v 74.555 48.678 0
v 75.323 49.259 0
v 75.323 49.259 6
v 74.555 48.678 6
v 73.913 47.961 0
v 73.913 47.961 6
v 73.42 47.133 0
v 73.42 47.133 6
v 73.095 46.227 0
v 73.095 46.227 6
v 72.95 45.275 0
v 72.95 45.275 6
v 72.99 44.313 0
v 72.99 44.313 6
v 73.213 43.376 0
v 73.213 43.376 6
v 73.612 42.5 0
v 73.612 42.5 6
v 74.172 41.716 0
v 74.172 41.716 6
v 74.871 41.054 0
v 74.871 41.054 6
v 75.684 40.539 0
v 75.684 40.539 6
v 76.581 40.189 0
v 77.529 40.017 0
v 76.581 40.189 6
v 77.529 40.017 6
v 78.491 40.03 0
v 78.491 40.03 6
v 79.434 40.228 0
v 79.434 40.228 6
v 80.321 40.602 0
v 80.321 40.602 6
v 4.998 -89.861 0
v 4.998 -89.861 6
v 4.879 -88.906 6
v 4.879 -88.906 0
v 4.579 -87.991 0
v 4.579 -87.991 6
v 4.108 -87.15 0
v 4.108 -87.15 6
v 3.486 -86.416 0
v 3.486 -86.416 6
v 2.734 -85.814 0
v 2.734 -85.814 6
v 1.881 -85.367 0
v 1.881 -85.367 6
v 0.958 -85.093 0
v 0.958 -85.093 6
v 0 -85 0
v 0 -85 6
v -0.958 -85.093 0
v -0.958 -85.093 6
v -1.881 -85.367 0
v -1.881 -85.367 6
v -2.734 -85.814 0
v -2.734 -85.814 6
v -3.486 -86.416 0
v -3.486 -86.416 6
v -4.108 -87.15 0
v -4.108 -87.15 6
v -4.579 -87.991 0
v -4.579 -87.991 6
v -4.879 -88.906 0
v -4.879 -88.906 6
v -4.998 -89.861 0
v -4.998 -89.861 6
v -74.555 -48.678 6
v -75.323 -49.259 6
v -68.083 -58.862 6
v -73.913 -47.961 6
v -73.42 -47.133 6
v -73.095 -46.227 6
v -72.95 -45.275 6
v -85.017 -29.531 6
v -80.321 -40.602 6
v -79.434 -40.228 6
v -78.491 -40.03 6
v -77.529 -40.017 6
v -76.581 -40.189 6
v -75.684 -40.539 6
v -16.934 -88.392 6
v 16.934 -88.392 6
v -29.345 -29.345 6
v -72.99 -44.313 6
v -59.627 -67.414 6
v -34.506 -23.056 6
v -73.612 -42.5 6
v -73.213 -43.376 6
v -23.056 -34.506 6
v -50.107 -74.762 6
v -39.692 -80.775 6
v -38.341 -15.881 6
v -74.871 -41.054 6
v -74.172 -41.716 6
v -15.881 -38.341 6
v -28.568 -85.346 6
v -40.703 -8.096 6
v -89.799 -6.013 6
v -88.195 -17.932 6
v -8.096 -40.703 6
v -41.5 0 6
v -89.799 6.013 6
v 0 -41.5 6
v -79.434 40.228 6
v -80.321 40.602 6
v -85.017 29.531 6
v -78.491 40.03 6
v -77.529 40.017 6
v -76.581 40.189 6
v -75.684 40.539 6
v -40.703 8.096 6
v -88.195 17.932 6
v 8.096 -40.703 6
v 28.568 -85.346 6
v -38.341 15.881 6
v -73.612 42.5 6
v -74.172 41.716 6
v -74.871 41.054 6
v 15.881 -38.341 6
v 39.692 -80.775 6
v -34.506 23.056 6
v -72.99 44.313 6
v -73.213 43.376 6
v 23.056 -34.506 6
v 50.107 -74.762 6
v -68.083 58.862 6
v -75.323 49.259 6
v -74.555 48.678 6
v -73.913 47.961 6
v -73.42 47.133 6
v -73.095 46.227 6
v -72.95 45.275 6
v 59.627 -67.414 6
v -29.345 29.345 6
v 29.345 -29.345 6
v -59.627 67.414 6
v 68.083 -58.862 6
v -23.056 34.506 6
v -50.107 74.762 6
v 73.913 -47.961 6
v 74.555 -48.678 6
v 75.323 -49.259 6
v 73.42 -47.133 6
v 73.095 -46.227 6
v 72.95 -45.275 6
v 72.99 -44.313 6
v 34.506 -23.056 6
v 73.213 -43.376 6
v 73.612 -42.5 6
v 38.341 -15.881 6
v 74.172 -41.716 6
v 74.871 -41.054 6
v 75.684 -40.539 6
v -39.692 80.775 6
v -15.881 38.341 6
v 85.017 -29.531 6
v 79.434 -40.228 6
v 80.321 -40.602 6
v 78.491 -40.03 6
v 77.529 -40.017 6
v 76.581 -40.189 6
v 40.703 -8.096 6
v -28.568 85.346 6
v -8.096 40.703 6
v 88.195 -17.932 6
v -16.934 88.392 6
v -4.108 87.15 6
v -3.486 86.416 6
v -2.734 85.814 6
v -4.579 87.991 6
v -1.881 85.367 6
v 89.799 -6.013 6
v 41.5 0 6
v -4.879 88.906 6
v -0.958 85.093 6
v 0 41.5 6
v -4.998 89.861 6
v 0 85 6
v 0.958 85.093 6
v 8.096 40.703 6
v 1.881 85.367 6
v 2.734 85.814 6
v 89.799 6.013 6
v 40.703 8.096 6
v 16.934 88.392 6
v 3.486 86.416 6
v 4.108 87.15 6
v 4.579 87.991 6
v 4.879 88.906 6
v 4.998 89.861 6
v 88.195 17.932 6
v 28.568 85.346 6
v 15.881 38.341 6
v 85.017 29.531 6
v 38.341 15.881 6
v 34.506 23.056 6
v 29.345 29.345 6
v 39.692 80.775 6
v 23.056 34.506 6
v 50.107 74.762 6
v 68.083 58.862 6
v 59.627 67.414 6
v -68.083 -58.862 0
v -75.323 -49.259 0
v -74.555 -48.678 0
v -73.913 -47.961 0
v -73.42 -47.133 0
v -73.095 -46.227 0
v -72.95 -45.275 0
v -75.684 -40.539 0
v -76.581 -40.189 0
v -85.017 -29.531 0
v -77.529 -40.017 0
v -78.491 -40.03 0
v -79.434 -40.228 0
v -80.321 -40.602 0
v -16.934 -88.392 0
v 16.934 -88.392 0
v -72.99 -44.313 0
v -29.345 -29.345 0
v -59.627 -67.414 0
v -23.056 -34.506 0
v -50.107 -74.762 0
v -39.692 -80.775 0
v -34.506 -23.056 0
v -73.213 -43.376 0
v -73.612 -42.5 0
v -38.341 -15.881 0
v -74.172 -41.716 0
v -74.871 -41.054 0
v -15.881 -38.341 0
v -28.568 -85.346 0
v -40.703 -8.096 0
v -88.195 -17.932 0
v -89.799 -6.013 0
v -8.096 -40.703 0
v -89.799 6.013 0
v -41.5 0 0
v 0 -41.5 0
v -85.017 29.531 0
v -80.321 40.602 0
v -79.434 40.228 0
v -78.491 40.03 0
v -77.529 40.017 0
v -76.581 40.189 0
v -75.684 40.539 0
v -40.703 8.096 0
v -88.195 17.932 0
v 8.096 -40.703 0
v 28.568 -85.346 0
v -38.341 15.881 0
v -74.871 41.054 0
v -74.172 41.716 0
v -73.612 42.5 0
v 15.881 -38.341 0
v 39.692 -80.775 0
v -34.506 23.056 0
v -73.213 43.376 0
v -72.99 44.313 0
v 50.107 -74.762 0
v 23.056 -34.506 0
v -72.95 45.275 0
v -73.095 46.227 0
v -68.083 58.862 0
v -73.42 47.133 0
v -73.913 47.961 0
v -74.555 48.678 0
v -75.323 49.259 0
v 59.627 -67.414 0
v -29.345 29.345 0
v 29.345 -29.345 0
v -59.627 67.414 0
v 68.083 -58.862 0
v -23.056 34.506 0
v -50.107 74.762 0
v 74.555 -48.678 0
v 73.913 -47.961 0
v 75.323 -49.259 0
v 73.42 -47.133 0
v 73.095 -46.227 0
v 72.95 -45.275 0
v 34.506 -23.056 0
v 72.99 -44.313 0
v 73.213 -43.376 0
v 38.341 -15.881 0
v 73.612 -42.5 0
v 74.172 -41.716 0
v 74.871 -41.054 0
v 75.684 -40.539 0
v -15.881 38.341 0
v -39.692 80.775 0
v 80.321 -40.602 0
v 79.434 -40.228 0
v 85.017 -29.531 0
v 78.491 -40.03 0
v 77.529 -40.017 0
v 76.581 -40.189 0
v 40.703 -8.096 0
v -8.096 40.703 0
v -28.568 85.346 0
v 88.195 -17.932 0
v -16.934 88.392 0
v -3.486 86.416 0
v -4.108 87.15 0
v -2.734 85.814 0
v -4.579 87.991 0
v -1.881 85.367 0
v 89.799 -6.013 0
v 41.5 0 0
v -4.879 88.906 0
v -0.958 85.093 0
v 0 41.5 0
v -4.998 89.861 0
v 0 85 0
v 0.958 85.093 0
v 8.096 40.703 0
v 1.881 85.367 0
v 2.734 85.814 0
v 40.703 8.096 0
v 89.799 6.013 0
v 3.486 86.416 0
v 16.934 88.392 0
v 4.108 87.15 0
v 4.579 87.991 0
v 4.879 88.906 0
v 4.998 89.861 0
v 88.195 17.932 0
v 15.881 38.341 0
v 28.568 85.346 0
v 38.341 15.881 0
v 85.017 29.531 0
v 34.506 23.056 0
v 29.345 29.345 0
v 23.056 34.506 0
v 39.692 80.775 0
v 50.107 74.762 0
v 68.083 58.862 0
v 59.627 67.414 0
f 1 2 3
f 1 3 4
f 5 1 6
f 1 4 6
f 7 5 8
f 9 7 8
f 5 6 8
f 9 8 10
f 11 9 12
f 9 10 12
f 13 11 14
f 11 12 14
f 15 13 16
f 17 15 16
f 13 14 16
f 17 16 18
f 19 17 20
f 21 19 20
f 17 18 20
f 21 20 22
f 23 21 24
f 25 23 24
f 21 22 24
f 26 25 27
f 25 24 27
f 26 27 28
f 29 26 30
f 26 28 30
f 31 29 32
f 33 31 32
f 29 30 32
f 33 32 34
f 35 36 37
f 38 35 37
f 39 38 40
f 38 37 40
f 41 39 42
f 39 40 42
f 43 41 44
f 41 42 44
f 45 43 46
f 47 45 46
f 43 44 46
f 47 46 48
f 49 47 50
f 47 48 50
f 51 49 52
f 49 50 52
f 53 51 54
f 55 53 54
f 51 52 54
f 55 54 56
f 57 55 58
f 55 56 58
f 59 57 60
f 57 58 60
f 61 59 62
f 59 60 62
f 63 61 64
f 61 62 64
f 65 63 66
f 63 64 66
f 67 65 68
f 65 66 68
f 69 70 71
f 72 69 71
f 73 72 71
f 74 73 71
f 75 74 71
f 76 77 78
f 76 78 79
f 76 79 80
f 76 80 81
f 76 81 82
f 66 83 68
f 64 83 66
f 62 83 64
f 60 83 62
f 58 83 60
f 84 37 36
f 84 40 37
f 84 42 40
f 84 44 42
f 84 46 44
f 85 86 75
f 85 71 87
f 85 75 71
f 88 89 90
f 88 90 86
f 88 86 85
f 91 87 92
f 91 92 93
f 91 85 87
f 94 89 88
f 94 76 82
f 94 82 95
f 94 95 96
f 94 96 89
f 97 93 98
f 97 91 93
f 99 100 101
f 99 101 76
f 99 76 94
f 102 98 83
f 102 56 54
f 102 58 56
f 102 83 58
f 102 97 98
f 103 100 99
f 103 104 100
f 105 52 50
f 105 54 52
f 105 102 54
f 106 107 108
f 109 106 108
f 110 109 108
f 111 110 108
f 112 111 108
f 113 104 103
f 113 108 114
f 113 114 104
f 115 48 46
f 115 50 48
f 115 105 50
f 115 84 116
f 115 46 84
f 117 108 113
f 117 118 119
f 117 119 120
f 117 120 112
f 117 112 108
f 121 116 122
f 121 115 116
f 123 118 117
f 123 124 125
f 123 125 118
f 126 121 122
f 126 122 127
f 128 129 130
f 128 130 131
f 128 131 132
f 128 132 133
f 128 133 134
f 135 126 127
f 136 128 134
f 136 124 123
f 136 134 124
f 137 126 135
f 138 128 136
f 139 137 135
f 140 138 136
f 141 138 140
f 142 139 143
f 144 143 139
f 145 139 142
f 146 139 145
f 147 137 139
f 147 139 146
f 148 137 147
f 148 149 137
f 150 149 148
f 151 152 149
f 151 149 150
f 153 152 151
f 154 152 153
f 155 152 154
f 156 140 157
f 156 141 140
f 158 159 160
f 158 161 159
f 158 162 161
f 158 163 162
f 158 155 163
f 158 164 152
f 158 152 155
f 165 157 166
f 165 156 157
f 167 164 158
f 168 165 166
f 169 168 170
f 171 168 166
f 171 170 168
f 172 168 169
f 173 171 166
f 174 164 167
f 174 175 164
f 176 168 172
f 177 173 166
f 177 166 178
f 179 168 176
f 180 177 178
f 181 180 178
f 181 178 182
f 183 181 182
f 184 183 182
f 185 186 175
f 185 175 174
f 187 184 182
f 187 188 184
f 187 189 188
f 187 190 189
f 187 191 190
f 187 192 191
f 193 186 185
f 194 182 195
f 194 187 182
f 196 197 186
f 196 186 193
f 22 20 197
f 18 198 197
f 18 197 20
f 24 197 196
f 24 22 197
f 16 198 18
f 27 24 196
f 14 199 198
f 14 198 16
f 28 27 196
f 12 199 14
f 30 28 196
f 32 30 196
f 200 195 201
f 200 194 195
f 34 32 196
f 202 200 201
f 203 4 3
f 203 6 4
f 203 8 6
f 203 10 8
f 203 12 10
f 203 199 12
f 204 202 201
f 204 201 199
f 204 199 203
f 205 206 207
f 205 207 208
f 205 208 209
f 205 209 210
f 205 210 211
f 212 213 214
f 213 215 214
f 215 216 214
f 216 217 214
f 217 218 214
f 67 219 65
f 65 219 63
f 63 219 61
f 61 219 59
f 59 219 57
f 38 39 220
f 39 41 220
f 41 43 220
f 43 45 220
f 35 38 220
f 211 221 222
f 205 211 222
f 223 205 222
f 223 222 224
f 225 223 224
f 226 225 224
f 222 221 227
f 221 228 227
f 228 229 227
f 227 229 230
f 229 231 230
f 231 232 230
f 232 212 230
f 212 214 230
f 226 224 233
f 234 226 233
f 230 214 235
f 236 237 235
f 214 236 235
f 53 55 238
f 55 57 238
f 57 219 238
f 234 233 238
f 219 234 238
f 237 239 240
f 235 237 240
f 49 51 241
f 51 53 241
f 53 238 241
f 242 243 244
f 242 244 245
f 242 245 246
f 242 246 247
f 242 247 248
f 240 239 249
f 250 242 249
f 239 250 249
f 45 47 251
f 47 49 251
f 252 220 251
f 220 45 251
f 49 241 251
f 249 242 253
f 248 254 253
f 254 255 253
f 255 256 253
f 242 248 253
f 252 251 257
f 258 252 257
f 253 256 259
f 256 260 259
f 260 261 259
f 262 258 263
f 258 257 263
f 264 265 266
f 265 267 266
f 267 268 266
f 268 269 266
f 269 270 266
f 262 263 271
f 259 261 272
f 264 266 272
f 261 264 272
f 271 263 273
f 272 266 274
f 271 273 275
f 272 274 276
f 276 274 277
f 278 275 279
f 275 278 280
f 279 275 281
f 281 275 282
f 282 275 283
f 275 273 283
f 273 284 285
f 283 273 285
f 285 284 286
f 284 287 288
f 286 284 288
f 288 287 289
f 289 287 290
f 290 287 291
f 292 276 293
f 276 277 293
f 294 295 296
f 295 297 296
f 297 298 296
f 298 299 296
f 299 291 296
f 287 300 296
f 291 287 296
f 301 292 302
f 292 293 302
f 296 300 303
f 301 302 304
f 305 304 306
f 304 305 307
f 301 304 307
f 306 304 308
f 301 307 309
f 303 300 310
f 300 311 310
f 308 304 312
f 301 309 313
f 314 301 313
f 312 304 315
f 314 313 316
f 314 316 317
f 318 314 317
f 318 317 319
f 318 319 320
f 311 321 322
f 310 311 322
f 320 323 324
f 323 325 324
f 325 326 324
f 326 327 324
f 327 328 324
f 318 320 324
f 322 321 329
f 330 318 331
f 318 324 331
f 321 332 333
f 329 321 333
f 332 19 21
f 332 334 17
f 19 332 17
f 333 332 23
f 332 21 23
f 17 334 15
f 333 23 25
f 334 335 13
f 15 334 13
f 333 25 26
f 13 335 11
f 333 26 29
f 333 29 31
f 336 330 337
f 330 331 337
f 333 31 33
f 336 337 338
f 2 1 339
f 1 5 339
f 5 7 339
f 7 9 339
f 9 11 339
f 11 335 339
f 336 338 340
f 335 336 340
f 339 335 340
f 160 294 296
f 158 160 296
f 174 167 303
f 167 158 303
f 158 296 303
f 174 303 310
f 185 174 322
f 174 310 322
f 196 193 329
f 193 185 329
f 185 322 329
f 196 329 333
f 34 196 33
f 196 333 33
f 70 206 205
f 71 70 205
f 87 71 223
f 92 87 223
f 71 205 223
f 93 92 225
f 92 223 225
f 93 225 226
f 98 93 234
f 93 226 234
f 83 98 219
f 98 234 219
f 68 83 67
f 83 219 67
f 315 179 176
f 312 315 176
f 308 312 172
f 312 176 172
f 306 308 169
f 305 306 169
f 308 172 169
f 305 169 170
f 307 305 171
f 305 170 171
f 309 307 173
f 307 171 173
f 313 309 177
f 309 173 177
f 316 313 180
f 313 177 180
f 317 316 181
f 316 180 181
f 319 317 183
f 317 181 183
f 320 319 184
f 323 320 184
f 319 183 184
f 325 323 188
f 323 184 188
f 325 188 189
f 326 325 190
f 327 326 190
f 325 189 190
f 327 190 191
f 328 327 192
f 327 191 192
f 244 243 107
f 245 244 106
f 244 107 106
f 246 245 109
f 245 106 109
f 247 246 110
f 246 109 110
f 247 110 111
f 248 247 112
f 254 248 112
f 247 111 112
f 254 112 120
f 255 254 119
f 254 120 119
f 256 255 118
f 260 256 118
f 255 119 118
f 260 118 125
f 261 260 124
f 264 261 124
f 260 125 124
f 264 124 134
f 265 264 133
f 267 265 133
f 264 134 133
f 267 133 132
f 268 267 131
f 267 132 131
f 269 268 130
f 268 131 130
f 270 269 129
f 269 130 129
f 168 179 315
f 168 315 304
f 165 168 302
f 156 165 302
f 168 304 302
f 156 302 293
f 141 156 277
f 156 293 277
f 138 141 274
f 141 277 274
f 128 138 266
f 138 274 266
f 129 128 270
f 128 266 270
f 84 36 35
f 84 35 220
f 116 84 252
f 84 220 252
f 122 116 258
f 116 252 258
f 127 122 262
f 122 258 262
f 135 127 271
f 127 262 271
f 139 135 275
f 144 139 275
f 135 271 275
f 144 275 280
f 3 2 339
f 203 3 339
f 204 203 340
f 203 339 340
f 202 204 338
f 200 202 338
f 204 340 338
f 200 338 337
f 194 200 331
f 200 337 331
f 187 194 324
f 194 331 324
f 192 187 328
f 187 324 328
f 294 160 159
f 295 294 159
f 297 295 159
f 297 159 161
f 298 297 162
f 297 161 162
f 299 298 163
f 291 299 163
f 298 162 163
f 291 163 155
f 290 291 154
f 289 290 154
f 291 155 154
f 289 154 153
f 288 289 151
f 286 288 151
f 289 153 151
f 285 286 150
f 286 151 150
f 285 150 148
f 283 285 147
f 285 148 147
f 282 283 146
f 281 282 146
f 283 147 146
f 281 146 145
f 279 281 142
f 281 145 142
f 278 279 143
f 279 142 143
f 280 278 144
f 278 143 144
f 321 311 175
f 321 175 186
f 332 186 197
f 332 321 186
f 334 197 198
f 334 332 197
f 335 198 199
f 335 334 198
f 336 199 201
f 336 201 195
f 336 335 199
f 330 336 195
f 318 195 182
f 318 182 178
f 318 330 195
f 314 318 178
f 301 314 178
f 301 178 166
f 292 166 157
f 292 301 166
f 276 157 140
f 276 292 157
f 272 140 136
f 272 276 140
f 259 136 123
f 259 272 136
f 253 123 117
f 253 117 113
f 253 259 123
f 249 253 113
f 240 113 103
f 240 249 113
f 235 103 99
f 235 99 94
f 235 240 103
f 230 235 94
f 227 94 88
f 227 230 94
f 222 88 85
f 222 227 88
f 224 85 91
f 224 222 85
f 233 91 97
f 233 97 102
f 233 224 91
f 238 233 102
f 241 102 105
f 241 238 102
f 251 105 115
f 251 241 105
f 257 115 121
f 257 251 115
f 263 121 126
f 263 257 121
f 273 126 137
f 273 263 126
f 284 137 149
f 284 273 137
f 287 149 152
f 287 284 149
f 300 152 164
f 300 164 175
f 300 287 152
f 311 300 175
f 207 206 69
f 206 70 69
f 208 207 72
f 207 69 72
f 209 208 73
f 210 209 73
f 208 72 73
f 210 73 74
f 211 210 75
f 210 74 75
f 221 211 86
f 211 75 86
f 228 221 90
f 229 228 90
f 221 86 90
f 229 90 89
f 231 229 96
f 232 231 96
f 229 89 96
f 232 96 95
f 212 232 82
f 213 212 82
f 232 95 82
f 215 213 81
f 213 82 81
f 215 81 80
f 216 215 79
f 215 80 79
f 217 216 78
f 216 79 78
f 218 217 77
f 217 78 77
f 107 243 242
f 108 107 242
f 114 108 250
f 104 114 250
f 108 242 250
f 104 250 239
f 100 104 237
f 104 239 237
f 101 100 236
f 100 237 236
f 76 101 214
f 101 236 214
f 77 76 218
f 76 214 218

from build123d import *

# Parameters (mm, degrees)
SKETCH1_R                  = 90
SKETCH1_R_2                = 41.5
BOSS_EXTRUDE1_DEPTH        = 6
F_10_0MM_DOWEL_HOLE1_D     = 10
F_10_0MM_DOWEL_HOLE1_DEPTH = 9.906
F_10_0MM_DOWEL_HOLE1_TIP   = 3.004303095


with BuildPart() as part:
    # Sketch1 → Boss-Extrude1 (new body)
    with BuildSketch(Plane.XY):
        Circle(SKETCH1_R)
        Circle(SKETCH1_R_2, mode=Mode.SUBTRACT)
    extrude(amount=BOSS_EXTRUDE1_DEPTH)

    # Ø10.0mm Dowel Hole1
    with Locations(Plane(origin=(0, 0, 0), x_dir=(-1, 0, 0), z_dir=(0, 0, -1))):
        with Locations((-77.942286341, 45), (-77.942286341, -45), (0, -90), (77.942286341, -45), (77.942286341, 45), (0, 90)):
            Hole(F_10_0MM_DOWEL_HOLE1_D / 2, depth=F_10_0MM_DOWEL_HOLE1_DEPTH)
            with Locations((0, 0, -(F_10_0MM_DOWEL_HOLE1_DEPTH + F_10_0MM_DOWEL_HOLE1_TIP / 2))):  # 118° drill point
                Cone(0, F_10_0MM_DOWEL_HOLE1_D / 2, F_10_0MM_DOWEL_HOLE1_TIP, mode=Mode.SUBTRACT)


solid = part.part
